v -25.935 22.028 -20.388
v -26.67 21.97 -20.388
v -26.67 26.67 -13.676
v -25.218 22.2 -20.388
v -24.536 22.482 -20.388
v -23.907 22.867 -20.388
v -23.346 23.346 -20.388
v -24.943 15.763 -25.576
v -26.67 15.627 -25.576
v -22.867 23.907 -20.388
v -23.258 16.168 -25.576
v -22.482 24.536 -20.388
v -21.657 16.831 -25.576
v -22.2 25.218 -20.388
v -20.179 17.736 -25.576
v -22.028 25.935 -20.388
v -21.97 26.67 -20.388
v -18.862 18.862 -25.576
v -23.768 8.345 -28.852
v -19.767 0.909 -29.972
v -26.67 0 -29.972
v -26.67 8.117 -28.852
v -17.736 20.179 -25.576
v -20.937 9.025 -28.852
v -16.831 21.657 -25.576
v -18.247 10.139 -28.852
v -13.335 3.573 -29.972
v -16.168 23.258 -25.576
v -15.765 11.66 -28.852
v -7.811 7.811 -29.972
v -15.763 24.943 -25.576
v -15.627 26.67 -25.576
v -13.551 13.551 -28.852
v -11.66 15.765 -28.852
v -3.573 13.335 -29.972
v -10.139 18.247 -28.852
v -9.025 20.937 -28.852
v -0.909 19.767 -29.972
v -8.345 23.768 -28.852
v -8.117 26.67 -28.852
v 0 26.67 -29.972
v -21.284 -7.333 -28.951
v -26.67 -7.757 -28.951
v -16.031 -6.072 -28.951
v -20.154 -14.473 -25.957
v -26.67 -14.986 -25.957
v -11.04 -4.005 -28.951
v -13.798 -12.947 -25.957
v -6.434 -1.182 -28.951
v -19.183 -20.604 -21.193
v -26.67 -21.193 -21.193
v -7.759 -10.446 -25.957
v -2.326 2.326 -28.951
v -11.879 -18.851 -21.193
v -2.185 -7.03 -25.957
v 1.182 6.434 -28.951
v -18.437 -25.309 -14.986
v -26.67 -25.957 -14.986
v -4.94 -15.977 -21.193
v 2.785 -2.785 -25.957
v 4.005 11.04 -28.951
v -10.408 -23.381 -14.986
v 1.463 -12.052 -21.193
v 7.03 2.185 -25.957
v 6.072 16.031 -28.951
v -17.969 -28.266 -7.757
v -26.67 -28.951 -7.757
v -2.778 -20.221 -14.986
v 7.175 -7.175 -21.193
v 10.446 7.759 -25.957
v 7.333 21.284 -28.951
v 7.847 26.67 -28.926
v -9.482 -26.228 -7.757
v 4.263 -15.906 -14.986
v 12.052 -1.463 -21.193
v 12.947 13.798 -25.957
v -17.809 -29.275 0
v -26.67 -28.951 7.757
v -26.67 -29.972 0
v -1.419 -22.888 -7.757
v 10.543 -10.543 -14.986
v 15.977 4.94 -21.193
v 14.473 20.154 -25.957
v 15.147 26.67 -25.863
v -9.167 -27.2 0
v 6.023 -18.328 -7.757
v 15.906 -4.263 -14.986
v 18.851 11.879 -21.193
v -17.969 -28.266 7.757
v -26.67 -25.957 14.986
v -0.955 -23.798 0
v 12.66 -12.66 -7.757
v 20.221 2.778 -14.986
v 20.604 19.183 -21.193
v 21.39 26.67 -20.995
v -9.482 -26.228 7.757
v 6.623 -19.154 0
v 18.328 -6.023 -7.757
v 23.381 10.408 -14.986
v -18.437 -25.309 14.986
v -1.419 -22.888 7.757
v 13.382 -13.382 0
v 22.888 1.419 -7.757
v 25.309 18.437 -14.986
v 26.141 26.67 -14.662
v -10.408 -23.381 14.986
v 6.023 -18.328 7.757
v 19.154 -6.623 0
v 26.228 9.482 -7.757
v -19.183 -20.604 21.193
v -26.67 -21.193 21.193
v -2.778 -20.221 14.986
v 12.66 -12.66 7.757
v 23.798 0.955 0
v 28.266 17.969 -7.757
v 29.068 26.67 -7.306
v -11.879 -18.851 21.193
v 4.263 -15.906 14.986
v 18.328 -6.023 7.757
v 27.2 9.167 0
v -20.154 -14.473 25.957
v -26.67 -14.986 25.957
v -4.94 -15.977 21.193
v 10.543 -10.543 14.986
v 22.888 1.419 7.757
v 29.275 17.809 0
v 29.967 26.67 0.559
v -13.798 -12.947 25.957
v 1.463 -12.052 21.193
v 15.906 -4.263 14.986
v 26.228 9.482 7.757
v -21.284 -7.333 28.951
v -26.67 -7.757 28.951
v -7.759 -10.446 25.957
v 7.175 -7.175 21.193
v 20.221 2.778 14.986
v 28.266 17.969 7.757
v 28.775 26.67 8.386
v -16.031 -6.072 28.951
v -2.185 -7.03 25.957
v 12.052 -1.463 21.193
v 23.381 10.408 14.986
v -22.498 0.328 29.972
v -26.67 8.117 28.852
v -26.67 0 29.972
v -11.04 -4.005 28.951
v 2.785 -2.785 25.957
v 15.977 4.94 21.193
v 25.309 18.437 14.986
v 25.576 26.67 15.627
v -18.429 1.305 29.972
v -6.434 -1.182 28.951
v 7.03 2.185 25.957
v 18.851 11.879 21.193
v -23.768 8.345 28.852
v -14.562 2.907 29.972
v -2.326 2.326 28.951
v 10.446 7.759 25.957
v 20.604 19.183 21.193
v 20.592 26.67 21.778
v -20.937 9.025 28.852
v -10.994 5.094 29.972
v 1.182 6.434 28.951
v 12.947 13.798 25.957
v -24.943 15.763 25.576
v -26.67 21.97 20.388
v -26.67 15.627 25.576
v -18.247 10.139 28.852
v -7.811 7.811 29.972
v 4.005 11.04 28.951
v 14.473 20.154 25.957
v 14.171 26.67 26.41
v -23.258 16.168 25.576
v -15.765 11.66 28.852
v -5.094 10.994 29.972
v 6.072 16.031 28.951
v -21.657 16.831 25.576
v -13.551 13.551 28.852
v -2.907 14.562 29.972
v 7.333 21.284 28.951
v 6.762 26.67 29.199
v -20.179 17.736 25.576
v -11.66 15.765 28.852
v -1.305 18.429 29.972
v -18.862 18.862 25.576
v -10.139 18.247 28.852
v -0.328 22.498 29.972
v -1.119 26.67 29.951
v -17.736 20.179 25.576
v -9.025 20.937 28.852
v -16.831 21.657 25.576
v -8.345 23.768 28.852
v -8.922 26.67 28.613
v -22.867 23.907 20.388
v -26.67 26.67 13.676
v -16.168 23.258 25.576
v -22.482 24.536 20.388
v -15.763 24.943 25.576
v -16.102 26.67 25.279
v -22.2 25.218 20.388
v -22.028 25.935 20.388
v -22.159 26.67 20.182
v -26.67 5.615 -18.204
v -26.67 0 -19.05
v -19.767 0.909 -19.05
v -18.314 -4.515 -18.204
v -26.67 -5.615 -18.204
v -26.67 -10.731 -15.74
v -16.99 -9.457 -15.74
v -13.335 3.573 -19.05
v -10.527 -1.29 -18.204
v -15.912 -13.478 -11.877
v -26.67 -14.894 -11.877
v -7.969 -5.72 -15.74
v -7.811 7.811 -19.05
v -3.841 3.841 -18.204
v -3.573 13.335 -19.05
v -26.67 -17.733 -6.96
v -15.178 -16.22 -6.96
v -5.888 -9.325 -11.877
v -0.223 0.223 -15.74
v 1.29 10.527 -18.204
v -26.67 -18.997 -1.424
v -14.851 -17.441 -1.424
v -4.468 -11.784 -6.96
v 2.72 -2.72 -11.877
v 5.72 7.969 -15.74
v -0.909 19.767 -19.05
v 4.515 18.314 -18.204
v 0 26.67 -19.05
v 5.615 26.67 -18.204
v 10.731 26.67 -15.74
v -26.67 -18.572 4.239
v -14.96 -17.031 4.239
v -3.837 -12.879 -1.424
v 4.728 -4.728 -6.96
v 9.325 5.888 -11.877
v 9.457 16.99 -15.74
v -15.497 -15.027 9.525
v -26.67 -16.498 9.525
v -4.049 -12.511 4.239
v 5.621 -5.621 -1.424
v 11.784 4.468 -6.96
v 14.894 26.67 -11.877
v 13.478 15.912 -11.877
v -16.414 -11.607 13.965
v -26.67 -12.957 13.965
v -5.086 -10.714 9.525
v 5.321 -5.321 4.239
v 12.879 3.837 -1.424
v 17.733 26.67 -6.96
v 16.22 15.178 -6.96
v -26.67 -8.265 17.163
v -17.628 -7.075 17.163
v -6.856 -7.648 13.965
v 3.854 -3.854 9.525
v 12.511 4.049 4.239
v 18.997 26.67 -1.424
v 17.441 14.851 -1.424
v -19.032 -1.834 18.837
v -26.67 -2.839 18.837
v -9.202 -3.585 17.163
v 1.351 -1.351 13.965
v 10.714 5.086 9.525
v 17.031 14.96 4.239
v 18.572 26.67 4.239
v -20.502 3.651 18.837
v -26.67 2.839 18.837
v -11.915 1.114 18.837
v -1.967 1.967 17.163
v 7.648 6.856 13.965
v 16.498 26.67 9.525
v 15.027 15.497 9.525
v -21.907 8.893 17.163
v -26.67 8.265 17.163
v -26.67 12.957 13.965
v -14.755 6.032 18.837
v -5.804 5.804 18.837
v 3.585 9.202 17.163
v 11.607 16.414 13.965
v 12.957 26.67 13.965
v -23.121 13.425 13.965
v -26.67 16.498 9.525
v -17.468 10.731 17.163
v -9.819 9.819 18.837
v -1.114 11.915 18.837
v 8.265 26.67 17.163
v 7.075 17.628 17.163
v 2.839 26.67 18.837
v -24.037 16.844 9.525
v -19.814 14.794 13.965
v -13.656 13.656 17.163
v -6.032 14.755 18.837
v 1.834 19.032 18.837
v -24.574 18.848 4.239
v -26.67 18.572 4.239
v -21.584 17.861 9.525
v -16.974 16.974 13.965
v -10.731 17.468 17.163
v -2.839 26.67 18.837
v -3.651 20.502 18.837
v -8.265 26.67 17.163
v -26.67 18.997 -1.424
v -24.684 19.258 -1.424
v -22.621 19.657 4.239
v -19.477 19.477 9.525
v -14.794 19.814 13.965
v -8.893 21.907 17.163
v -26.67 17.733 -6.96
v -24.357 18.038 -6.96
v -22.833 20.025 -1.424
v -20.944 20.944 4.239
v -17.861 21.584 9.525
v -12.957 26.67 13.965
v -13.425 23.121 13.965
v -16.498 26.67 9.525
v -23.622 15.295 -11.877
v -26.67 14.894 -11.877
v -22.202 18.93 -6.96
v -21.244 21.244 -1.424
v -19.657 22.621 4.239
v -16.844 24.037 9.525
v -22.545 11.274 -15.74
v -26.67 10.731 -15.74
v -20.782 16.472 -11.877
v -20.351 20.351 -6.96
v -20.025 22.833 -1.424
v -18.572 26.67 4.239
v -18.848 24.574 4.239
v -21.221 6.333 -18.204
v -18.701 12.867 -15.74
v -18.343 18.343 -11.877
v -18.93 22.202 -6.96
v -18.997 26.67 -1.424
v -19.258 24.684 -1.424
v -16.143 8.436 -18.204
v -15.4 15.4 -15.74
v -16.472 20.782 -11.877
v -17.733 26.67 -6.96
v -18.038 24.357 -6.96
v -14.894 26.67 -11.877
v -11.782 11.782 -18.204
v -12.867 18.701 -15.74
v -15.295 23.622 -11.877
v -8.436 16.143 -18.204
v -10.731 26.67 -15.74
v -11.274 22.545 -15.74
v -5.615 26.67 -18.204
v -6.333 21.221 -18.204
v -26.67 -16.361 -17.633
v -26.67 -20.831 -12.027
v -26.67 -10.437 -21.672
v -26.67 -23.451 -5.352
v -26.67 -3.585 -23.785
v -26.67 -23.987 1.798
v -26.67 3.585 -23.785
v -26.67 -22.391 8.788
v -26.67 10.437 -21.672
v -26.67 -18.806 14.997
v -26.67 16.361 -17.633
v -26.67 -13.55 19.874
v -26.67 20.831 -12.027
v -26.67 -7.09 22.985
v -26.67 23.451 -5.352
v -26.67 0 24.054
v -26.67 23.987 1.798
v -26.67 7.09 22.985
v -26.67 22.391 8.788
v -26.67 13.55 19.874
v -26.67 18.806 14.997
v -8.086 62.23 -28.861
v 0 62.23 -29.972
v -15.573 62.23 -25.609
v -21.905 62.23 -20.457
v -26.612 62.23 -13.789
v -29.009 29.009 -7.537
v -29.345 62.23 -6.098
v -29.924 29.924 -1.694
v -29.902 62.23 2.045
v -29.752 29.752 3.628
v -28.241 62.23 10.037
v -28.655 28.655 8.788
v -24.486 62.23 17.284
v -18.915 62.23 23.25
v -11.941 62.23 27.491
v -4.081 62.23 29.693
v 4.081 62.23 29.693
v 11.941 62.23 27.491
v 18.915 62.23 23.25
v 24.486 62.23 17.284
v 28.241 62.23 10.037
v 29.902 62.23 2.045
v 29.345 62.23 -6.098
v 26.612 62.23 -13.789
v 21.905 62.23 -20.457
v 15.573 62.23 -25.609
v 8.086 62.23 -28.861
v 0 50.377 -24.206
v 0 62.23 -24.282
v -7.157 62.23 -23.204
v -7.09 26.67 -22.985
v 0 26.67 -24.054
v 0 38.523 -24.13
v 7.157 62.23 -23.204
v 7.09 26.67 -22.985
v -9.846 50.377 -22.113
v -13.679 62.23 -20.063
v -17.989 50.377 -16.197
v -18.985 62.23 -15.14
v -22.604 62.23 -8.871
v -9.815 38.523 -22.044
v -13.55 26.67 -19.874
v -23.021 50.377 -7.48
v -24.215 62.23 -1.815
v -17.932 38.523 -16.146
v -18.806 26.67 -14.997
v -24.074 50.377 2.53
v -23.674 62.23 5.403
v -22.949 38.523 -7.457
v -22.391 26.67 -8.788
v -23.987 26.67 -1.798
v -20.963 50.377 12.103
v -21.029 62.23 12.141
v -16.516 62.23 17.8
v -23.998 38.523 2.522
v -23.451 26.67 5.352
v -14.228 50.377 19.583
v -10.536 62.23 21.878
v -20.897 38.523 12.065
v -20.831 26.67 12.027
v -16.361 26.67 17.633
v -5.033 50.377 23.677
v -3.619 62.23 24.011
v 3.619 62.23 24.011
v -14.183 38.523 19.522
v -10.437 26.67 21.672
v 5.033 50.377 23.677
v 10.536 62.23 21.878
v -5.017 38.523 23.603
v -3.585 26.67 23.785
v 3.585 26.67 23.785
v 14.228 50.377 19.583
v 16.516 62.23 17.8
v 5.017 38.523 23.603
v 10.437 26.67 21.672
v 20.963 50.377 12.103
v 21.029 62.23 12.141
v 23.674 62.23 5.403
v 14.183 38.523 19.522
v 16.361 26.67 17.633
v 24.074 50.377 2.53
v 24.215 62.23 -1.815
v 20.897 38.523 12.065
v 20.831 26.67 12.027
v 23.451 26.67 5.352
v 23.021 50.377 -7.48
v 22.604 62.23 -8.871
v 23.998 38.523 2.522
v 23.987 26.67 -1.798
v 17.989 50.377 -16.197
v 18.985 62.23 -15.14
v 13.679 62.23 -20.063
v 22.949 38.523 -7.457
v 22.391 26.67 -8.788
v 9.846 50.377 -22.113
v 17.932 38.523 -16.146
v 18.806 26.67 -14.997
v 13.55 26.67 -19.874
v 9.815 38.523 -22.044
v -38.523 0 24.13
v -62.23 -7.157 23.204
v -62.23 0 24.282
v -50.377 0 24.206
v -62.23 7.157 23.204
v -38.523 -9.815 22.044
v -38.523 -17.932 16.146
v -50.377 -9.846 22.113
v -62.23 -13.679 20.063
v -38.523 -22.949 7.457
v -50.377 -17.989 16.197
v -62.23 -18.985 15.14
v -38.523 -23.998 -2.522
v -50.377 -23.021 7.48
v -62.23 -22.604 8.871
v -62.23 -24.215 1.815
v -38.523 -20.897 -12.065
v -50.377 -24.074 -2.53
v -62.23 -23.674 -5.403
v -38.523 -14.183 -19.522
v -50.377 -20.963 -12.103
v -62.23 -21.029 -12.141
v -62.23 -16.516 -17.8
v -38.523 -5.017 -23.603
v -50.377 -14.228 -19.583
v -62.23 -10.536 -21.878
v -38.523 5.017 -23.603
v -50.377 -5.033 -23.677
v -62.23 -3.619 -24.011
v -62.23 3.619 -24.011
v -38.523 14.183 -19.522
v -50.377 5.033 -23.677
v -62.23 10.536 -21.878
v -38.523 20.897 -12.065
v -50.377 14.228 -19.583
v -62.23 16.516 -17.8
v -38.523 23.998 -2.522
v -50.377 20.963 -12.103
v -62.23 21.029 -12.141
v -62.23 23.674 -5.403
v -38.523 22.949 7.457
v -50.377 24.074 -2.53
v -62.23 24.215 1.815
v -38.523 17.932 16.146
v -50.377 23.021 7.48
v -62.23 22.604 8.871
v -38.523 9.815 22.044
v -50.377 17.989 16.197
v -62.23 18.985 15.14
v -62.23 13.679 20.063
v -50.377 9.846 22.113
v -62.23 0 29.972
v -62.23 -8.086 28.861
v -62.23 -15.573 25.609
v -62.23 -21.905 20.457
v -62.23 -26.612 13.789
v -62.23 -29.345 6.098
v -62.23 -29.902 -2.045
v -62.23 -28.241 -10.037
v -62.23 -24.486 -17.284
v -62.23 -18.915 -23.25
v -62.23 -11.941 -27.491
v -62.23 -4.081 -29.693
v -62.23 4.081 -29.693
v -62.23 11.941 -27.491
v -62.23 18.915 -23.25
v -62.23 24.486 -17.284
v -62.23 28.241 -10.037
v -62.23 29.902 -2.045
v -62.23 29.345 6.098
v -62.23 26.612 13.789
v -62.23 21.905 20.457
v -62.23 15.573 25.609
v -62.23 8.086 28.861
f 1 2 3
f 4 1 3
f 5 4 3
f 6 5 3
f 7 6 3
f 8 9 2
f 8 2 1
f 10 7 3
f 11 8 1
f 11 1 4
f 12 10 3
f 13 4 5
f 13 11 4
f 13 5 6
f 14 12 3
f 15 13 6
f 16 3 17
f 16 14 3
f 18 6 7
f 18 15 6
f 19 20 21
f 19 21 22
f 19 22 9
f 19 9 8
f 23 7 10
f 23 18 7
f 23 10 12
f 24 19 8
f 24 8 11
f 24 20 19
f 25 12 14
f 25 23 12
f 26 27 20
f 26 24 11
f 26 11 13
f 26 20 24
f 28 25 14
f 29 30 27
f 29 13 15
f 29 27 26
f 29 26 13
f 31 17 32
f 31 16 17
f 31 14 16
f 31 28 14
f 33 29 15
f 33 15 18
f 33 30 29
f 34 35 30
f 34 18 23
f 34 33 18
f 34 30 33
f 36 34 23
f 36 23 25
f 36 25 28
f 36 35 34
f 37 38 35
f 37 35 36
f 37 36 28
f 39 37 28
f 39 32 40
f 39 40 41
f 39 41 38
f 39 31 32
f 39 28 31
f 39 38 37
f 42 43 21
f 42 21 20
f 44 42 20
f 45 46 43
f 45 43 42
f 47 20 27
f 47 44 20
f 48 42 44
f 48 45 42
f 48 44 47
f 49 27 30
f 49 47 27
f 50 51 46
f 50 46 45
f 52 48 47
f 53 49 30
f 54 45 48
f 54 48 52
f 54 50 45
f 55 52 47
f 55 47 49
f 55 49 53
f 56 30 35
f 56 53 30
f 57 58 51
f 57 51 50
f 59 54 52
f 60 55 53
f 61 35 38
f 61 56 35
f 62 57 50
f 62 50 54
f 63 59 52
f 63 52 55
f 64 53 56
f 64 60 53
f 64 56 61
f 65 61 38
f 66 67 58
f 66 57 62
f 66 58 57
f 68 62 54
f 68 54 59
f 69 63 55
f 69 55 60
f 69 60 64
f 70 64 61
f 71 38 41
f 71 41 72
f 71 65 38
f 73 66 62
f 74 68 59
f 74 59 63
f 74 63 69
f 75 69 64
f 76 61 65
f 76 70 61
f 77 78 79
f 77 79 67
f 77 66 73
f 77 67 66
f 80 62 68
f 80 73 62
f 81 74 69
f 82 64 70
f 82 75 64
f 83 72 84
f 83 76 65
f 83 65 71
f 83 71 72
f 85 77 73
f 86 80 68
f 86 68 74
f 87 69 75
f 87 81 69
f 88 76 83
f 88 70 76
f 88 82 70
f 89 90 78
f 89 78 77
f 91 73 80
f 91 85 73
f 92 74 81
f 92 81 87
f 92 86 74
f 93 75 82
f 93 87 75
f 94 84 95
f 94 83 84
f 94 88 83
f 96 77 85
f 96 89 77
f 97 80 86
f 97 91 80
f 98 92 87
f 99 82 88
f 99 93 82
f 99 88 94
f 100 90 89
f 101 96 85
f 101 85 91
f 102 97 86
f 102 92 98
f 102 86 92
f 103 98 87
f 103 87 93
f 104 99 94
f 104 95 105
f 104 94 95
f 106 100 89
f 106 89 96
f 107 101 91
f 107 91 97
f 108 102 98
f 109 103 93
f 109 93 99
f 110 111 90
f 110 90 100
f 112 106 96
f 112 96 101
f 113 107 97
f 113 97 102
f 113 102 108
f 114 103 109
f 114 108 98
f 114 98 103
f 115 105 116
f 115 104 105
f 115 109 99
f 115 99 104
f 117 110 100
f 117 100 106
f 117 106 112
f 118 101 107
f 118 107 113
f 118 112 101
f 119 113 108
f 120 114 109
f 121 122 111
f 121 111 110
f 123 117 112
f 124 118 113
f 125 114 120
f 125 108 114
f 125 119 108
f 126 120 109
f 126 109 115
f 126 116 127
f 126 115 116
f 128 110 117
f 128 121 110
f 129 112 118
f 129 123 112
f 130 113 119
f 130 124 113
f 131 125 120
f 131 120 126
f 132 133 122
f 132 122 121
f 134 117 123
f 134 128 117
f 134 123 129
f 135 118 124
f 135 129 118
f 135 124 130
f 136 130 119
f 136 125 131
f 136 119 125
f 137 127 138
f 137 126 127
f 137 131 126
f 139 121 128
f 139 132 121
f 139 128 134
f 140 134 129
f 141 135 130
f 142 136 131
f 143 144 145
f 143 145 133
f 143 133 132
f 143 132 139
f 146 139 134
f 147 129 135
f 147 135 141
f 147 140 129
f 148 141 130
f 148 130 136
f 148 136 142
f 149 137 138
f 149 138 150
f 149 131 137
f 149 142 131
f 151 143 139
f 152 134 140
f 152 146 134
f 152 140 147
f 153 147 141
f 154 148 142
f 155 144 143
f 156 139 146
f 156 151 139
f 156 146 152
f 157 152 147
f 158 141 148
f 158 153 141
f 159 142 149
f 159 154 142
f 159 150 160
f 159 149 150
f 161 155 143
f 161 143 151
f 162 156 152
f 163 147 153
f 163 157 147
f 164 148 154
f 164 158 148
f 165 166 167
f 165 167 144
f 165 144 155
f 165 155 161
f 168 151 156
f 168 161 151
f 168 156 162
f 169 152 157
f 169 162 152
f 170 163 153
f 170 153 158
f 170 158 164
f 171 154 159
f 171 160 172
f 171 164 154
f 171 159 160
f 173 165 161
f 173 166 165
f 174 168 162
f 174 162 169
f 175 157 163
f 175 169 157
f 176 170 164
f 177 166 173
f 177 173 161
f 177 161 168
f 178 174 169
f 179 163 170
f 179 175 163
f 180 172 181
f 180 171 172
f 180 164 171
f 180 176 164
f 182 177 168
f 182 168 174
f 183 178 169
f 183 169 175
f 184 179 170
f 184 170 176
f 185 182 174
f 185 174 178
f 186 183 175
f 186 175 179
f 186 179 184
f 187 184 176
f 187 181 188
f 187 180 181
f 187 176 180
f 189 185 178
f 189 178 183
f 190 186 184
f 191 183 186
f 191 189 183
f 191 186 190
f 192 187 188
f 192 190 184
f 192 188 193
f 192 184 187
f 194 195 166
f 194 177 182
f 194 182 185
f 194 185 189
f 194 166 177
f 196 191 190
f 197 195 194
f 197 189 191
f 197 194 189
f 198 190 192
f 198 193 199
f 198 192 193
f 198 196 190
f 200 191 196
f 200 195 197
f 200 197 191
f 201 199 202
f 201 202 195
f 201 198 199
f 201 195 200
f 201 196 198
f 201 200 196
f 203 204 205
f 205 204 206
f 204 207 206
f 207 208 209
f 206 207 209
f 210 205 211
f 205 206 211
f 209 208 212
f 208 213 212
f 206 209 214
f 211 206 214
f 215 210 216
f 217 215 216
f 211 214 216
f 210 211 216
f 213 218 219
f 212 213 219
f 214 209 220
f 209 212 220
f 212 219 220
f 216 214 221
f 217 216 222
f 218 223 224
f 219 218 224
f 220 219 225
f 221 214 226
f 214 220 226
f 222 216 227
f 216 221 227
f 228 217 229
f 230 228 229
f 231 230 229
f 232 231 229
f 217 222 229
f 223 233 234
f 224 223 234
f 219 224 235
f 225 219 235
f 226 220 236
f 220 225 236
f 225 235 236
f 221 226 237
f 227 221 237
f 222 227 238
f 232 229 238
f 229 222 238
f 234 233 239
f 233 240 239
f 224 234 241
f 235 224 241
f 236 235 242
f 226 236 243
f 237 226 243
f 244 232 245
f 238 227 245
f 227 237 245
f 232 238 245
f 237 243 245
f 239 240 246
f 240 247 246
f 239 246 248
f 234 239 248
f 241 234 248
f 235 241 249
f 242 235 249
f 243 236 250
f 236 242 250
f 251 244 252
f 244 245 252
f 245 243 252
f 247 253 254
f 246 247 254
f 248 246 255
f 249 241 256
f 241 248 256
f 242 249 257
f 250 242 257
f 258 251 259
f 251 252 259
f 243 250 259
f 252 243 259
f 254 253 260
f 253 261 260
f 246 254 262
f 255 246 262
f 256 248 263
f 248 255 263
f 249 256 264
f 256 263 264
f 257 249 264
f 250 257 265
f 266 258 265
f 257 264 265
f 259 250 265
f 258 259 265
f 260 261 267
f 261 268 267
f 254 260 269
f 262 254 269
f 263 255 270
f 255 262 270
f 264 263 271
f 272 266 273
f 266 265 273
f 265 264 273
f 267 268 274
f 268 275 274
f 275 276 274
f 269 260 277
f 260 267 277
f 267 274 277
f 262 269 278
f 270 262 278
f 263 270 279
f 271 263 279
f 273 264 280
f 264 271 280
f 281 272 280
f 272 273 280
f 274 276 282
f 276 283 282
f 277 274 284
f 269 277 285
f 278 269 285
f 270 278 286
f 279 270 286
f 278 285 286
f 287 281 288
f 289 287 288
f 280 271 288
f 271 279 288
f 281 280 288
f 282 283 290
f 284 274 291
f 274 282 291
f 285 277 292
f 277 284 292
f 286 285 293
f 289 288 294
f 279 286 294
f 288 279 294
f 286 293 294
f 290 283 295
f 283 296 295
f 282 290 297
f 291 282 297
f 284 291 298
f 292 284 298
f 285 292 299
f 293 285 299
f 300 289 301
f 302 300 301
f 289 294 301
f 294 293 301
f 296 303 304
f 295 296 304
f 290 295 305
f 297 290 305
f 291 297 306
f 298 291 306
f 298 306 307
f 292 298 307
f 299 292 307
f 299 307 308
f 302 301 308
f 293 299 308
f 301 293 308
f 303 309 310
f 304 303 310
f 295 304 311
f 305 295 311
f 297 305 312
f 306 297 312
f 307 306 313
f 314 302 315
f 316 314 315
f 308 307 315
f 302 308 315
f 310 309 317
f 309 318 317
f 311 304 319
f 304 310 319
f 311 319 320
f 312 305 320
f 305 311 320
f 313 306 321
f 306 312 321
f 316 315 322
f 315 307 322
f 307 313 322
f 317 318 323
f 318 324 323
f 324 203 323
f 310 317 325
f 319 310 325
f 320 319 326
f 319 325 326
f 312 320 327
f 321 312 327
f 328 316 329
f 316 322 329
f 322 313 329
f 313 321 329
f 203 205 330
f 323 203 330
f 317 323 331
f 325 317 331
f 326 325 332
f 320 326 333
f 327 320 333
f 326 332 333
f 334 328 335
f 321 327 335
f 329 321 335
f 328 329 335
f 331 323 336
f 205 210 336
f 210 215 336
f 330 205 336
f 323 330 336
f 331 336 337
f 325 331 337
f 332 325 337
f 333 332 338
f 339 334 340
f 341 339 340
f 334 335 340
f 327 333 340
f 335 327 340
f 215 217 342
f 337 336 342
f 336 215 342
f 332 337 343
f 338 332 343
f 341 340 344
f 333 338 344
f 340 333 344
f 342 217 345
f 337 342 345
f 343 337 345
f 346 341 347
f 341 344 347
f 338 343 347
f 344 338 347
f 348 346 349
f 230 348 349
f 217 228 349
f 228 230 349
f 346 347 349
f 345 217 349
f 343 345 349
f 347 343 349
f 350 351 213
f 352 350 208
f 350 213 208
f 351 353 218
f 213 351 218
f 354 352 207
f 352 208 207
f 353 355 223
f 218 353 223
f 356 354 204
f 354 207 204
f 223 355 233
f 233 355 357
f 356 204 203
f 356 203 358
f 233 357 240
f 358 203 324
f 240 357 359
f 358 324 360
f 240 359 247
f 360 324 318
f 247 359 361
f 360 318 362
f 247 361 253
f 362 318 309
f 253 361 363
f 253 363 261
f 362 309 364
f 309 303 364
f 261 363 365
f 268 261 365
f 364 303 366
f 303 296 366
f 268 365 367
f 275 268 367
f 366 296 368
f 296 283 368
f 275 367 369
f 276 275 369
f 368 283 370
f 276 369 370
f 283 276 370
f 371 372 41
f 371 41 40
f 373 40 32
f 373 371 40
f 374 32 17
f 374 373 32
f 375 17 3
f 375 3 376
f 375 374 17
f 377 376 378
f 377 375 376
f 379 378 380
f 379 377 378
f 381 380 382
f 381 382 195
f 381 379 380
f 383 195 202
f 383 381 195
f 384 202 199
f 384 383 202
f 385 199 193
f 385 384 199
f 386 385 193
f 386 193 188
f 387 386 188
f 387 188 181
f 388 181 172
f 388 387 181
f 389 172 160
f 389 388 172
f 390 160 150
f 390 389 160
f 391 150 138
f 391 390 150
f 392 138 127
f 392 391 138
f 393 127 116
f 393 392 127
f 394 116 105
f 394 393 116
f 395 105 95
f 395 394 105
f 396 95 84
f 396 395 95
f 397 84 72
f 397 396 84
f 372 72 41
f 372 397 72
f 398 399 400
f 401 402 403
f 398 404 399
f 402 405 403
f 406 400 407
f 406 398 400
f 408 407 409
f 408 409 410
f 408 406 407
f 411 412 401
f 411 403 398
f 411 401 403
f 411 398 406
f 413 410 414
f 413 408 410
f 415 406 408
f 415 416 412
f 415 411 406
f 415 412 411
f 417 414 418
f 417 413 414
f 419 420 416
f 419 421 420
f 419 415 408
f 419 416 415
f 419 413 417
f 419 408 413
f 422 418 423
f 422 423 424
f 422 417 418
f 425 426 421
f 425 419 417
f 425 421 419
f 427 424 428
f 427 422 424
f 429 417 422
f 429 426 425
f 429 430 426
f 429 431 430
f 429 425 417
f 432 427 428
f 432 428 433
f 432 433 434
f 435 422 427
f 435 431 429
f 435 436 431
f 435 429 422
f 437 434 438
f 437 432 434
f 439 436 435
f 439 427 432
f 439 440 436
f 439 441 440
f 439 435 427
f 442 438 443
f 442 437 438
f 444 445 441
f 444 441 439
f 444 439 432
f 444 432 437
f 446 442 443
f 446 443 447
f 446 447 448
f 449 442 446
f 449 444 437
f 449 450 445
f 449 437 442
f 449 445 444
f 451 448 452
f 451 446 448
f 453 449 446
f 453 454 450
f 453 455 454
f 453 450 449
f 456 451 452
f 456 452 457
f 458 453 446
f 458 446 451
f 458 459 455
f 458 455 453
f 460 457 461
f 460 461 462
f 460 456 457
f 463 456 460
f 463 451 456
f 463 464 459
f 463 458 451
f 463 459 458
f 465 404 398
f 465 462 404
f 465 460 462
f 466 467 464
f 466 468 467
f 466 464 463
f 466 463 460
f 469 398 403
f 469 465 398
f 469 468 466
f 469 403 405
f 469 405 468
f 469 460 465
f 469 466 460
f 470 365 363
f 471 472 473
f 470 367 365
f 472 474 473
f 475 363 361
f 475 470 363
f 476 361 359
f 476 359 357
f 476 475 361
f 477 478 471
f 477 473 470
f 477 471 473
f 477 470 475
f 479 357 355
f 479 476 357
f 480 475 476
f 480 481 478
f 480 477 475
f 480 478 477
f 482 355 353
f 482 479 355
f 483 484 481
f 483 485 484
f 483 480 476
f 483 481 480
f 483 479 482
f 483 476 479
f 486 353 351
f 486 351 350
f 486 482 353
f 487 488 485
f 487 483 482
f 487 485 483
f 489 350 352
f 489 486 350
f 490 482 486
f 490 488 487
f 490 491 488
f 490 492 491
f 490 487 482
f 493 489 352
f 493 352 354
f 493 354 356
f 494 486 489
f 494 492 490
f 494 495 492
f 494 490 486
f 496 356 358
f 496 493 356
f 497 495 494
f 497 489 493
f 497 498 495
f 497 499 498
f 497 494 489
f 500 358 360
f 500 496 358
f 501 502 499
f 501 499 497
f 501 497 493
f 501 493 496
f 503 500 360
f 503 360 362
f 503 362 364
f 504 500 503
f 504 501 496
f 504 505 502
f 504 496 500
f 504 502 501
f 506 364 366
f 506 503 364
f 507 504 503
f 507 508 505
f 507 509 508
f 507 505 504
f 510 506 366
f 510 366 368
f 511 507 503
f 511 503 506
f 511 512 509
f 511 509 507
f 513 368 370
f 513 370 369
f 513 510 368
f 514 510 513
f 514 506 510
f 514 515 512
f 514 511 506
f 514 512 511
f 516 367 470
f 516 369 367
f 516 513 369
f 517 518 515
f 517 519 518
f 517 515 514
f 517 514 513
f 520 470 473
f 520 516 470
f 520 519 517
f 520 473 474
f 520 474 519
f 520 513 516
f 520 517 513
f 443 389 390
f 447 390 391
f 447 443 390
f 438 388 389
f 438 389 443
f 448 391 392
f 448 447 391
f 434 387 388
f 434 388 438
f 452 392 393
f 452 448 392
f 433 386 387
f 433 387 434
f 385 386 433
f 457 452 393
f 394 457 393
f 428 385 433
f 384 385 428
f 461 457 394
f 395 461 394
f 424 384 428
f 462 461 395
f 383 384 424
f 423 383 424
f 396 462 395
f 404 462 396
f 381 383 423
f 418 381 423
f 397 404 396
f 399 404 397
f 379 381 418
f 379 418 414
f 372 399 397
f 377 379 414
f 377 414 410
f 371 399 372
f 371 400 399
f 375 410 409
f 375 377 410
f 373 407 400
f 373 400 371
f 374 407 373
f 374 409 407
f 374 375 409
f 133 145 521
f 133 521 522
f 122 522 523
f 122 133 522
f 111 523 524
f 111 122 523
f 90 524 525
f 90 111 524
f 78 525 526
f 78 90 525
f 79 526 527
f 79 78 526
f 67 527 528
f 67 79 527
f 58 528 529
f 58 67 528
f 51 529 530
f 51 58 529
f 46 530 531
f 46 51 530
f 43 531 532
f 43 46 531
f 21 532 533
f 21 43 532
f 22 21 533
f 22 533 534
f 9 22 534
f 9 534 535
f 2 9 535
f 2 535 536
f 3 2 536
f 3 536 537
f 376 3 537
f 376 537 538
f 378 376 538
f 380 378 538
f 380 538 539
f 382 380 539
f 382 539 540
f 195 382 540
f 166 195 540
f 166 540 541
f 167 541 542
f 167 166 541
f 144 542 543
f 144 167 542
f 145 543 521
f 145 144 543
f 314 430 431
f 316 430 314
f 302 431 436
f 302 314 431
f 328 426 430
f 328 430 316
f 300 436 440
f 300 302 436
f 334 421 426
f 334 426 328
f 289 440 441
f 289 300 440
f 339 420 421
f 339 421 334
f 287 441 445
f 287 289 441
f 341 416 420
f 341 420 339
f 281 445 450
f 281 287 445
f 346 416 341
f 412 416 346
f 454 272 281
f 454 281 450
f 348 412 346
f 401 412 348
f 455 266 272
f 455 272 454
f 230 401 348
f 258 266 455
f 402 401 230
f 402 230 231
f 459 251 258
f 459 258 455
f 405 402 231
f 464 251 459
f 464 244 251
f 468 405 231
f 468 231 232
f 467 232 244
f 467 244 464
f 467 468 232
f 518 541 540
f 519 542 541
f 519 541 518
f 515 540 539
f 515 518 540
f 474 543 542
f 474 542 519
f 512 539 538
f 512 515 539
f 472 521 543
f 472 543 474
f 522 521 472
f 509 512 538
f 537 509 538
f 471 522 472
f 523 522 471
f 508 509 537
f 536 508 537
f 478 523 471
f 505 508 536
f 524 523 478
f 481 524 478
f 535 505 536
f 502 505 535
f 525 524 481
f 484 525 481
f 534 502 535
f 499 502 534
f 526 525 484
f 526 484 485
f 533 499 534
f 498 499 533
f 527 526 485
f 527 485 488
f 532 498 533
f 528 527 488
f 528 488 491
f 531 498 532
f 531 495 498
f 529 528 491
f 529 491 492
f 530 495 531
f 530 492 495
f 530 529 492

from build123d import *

# Parameters (mm, degrees)
SKETCH3_R   = 29.972
SKETCH3_R_2 = 19.05


with BuildPart() as part:
    # Sketch1 → Revolve1 (revolve)
    with BuildSketch(Plane.XY):
        Polygon((-62.23, -29.972), (-26.67, -29.972), (-26.67, -24.0538), (-62.23, -24.2824), align=None)
    revolve(axis=Axis((-62.23, 0, 0), (1, 0, 0)))


with BuildPart() as body_2:
    # Sketch2 → Revolve2 (revolve)
    with BuildSketch(Plane.XY):
        Polygon((24.2824, 62.23), (24.0538, 26.67), (29.972, 26.67), (29.972, 62.23), align=None)
    revolve(axis=Axis((0, 0, 0), (0, 1, 0)))


with BuildPart() as sweep1_tool:
    # Sweep1: sweep along a path in Sketch4
    with BuildLine(Plane.XY) as sweep1_path:
        ThreePointArc((-26.67, 0), (-7.811462, 7.811462), (0, 26.67))
    # Sketch3 → Sweep1 (sweep)
    with BuildSketch(Plane(origin=(-26.67, 0, 0), x_dir=(0, 0, -1), z_dir=(1, 0, 0))):
        Circle(SKETCH3_R)
        Circle(SKETCH3_R_2, mode=Mode.SUBTRACT)
    sweep(path=sweep1_path.line)


with BuildPart() as part_1:
    add(part.part)


with BuildPart() as part_2:
    # Sweep1: joined with sweep1_tool
    add(part_1.part.fuse(sweep1_tool.part, body_2.part, tol=0.00001))


solid = part_2.part
